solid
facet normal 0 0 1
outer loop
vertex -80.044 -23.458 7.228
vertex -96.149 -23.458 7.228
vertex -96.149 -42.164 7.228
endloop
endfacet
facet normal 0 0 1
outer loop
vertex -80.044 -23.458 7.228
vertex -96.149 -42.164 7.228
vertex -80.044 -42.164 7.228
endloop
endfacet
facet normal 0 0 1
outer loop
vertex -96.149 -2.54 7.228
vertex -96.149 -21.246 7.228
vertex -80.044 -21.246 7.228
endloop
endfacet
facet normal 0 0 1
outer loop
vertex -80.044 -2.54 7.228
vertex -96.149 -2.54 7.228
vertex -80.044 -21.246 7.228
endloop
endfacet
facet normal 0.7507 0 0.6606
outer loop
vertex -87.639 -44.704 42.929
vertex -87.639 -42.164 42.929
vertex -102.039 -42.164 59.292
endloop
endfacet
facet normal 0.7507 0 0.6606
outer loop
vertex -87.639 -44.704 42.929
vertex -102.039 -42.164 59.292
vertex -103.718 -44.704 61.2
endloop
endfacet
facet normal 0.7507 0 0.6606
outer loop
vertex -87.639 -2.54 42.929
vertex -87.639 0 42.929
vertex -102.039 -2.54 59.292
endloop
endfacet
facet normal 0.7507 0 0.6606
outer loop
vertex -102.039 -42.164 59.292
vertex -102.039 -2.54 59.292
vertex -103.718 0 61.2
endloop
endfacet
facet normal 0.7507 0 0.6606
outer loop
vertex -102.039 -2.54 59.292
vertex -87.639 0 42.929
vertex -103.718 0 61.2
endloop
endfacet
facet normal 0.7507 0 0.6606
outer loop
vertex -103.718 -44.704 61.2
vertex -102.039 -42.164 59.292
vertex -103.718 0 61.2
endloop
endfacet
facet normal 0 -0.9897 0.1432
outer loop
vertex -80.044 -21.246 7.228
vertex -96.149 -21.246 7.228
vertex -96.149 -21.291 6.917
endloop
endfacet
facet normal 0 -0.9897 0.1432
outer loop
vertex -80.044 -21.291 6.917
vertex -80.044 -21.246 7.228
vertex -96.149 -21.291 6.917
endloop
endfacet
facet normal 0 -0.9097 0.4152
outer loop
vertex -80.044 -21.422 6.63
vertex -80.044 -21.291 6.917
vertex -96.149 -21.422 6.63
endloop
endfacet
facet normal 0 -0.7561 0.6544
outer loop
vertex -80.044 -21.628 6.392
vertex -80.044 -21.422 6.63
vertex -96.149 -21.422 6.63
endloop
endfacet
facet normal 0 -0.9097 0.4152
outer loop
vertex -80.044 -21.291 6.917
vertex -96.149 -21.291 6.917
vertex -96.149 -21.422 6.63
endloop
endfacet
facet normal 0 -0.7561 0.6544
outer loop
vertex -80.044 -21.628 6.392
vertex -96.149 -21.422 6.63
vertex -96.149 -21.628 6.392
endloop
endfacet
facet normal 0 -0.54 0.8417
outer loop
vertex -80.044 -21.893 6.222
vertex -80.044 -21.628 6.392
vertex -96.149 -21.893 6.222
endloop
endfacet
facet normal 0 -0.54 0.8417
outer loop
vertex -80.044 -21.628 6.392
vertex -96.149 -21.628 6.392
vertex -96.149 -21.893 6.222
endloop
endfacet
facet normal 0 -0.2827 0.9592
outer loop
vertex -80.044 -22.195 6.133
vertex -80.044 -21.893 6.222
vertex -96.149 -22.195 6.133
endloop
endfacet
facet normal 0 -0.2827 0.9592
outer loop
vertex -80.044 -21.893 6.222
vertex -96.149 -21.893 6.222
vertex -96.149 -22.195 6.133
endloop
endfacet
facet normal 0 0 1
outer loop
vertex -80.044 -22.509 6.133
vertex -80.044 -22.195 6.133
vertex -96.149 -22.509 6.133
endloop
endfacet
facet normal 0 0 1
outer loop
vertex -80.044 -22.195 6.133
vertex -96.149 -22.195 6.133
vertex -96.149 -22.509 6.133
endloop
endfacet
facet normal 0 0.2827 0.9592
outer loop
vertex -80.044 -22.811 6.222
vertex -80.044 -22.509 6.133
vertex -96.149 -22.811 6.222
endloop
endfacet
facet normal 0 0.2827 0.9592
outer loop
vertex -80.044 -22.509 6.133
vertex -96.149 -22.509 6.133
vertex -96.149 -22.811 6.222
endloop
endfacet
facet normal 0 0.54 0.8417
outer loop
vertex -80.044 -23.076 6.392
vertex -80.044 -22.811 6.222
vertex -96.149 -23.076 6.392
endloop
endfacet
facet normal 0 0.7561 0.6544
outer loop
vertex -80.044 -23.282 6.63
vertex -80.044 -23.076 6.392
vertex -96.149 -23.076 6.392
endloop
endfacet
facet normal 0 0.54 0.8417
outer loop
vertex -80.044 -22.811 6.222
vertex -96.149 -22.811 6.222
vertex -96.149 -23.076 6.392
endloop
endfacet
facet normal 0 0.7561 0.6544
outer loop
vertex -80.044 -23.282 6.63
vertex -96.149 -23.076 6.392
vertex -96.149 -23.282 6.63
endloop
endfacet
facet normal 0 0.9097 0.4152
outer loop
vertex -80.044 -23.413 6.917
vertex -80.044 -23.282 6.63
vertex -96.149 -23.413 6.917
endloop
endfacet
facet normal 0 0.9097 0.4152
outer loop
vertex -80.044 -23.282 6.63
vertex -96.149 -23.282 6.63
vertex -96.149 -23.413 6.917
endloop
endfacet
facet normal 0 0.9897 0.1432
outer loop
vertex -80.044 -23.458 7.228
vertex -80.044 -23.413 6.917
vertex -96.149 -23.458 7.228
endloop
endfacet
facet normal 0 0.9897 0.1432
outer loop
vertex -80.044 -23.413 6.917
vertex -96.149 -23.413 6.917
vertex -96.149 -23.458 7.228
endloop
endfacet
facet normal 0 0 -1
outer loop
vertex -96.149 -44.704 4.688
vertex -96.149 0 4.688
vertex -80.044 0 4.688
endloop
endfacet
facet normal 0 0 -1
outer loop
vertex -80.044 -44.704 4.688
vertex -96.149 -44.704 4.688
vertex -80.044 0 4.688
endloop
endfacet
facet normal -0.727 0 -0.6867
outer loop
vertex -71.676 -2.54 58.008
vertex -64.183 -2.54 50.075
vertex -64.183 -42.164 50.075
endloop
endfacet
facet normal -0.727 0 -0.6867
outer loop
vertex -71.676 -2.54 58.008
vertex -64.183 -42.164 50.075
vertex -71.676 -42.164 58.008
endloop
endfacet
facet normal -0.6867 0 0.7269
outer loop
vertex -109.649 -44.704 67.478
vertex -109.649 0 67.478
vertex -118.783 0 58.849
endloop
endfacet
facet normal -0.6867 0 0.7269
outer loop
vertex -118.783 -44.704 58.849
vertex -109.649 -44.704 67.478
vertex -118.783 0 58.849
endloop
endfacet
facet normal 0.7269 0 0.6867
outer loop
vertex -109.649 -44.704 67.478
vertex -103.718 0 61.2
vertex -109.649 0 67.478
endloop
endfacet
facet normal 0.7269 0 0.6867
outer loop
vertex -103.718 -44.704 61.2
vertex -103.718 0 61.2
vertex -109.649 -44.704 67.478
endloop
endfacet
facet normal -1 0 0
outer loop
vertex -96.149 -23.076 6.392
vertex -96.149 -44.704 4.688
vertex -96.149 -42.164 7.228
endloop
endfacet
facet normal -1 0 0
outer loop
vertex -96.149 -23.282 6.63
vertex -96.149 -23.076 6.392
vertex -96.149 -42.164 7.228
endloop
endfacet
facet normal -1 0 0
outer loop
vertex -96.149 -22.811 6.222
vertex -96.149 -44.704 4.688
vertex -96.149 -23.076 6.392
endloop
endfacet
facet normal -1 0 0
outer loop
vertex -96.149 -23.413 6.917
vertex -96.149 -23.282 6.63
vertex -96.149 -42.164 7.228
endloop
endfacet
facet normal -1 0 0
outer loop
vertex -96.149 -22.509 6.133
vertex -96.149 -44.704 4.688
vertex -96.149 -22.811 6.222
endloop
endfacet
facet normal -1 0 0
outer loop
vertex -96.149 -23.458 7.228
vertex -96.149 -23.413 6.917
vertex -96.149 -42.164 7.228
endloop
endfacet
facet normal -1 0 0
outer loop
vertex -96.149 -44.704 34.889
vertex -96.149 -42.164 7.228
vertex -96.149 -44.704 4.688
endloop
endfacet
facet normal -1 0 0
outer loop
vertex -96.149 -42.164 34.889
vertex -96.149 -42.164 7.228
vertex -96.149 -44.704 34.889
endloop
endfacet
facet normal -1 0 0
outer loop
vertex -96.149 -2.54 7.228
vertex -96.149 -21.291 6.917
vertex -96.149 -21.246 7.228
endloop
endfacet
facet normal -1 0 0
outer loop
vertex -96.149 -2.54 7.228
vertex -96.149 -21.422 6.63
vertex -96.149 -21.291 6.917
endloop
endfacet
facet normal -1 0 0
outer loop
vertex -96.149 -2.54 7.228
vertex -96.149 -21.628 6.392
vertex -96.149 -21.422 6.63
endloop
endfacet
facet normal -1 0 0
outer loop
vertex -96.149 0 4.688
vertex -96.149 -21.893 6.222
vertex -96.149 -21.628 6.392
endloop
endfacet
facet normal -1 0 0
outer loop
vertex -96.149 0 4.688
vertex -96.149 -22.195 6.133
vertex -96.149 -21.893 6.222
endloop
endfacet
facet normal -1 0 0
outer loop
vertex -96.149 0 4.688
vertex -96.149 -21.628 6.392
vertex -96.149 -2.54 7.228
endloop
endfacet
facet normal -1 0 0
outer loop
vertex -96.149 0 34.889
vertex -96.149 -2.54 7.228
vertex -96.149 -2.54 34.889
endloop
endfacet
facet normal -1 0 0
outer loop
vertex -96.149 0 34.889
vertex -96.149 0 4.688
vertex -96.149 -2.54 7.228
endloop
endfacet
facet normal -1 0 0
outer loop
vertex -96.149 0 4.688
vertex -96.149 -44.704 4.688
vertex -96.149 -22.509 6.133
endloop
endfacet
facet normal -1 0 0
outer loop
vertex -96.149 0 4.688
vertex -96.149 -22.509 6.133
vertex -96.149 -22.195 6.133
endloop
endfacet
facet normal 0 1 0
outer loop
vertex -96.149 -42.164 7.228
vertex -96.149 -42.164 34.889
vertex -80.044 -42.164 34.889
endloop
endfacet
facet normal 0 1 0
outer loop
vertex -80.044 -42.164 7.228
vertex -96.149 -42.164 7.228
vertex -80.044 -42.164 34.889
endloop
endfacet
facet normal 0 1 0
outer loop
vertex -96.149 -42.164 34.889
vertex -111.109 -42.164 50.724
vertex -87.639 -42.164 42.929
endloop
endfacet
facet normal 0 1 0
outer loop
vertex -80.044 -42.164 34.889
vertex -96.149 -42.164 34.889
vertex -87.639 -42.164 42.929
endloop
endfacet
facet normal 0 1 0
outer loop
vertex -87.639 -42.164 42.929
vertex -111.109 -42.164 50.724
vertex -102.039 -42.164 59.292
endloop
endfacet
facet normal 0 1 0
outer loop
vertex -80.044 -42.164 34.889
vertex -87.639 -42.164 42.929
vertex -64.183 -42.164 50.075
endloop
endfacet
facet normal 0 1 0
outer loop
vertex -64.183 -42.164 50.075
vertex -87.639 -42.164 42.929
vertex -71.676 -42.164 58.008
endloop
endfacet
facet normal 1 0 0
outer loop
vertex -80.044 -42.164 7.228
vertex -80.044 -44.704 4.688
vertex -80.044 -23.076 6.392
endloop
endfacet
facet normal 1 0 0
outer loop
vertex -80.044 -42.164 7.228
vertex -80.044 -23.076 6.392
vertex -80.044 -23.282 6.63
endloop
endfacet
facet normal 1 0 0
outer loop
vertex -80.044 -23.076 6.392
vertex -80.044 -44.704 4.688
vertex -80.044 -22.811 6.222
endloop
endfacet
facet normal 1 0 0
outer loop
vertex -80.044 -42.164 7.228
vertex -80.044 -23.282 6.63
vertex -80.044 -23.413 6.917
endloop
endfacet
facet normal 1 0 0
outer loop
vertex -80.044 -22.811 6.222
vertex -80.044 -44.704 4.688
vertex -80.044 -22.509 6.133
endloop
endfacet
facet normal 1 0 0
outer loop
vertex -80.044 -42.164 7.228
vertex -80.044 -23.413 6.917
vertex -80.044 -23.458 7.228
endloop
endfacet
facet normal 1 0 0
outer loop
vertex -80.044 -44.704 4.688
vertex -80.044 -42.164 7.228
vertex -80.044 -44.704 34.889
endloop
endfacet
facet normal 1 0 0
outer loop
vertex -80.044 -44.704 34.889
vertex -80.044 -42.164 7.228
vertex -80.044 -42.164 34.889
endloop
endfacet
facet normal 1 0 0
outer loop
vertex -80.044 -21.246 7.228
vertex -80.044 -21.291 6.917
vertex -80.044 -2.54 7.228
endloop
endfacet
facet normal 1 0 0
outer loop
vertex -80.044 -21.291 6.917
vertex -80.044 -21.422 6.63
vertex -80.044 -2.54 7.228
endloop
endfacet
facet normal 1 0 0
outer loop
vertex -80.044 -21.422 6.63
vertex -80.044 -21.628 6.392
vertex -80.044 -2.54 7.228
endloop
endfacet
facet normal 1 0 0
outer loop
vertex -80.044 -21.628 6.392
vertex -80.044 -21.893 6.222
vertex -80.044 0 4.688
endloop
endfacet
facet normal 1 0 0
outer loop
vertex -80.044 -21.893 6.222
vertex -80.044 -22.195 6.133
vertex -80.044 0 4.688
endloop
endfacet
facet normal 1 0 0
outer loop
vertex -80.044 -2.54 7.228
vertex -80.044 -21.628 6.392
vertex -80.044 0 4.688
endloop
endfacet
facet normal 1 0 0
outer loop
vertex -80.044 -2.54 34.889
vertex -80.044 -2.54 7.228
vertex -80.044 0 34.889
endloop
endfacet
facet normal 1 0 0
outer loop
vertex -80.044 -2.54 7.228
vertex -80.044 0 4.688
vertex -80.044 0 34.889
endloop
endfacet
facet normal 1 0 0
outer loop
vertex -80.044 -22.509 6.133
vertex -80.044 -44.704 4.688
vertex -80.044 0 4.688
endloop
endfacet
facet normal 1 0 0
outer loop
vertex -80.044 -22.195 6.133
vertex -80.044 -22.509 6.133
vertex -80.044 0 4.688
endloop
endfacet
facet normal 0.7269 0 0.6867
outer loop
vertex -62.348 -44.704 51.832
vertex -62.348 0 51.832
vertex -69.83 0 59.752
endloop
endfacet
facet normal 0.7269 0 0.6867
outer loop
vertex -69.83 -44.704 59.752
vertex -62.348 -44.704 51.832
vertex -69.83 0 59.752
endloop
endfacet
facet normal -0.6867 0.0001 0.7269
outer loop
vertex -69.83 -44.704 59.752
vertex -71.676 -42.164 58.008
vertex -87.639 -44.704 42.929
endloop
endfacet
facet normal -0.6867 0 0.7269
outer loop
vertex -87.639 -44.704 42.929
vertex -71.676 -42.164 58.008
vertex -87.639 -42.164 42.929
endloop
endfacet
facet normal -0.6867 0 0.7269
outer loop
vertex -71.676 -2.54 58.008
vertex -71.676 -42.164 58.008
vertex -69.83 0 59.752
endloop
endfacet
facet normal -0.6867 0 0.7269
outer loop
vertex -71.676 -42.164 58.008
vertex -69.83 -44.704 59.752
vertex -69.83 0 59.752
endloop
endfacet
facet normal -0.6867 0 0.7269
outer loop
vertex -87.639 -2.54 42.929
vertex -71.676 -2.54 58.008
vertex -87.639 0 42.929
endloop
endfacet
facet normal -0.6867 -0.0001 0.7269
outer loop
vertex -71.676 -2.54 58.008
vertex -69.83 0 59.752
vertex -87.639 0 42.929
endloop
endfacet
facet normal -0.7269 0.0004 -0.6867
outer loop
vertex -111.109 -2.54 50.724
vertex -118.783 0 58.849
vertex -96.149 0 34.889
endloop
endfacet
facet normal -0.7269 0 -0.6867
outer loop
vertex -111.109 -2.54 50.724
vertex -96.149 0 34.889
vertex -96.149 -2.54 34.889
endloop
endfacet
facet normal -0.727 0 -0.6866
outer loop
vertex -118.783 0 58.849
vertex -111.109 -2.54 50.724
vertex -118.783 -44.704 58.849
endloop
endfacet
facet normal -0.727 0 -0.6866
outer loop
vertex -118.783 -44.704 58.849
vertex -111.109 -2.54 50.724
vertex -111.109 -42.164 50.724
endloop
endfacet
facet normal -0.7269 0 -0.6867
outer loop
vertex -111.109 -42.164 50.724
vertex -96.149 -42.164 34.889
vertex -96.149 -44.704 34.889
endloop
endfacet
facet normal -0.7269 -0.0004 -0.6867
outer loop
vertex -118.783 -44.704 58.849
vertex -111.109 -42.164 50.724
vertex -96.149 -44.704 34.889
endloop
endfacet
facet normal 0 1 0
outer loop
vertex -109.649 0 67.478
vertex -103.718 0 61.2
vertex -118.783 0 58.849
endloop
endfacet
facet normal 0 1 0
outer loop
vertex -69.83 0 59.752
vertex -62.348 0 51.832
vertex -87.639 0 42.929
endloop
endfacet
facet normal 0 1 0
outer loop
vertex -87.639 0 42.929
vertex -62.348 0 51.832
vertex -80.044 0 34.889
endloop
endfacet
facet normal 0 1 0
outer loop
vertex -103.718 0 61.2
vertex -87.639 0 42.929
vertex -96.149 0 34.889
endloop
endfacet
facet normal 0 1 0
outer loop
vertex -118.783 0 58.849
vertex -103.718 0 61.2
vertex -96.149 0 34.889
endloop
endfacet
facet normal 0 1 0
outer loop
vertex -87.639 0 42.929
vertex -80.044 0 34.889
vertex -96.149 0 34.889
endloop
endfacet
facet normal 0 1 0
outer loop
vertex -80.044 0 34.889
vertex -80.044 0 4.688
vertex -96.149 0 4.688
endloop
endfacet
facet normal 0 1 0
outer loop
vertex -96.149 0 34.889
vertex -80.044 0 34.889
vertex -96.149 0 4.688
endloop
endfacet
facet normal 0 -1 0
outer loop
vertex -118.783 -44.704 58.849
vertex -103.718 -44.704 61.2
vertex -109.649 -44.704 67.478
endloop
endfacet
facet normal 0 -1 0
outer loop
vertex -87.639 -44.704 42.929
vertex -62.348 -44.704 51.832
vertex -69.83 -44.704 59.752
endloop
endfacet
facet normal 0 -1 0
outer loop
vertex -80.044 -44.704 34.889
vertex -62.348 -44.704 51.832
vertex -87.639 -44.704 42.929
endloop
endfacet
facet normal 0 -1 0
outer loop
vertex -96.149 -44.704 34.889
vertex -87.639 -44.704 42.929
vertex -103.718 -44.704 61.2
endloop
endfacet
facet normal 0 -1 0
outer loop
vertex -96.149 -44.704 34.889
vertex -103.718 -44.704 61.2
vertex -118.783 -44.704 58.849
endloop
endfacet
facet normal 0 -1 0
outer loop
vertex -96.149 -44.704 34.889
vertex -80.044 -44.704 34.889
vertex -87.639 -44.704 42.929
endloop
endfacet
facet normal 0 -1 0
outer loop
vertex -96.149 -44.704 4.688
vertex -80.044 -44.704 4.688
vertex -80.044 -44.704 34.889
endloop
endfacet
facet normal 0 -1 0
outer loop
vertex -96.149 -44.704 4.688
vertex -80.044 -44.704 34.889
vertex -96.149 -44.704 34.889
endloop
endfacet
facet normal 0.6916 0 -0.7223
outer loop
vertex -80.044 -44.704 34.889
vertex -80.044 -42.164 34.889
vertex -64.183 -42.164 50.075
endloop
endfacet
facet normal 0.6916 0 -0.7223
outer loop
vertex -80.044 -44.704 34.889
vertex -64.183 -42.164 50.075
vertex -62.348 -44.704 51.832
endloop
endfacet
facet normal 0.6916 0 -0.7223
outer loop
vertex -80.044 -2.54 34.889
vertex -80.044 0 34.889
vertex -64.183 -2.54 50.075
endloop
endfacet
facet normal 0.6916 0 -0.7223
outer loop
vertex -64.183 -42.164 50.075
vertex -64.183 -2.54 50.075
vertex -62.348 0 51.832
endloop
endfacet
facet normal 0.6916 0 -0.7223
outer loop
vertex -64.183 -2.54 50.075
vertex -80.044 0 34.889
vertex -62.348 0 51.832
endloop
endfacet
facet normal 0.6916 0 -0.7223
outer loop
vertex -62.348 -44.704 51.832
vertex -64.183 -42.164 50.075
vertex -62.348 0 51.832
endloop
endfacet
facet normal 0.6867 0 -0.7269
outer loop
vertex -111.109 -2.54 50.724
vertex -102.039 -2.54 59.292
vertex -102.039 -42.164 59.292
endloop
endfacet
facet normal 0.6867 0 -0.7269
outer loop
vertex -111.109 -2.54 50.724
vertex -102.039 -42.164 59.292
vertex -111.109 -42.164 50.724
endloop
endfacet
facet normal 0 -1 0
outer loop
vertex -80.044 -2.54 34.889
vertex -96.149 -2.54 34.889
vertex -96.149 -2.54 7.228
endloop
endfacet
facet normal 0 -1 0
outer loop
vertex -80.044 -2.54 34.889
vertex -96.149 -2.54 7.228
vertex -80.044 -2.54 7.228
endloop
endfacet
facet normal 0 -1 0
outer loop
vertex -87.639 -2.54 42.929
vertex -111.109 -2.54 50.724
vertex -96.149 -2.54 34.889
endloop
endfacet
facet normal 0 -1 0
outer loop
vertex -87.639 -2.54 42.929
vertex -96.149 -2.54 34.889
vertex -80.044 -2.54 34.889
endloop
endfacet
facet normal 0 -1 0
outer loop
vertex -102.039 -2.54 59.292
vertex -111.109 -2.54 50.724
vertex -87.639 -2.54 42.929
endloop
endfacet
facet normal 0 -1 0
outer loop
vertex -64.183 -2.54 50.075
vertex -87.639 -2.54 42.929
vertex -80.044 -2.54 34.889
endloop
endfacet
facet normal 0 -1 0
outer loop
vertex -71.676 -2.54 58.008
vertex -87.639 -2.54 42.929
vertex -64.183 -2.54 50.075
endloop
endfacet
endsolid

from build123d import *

# Parameters (mm, degrees)
F0_W     = 16.1053412664
F0_H     = 30.2006552678
F1_DEPTH = 44.704
F2_T     = -2.54
F3_DEPTH = 8.636
F5_DEPTH = 25.4


with BuildPart() as f1:
    # F0 (on Front) → F1 (new body)
    with BuildSketch(Plane.XZ):
        Polygon((-87.6387814232, 42.9285356432), (-103.7184670568, 61.1999630928), (-112.852960825, 52.5708459318), (-96.1492801466, 34.8888902675), align=None)
        Polygon((-80.0439388802, 34.8888902675), (-87.6387814232, 42.9285356432), (-96.1492801466, 34.8888902675), align=None)
        Polygon((-69.8299892996, 59.7520354048), (-87.6387814232, 42.9285356432), (-80.0439388802, 34.8888902675), (-62.3481592001, 51.8320212083), align=None)
        with Locations((-88.0966095134, 19.7885626337)):
            Rectangle(F0_W, F0_H)
    extrude(amount=F1_DEPTH)

    # F2
    f2_openings = [f1.faces().sort_by_distance(p)[0] for p in [
        (-104.50112, -22.352, 43.729868),
        (-96.14928, -22.352, 19.788563),
        (-80.043939, -22.352, 19.788563),
        (-71.196049, -22.352, 43.360456),
        (-95.678624, -22.352, 52.064249),
        (-78.734385, -22.352, 51.340286),
    ]]
    offset(amount=F2_T, openings=f2_openings)

    # F3 (add): a face of the model
    f3_faces = [f1.faces().sort_by_distance(p)[0] for p in [
        (-108.2857139409, -22.352, 56.8854045123),
    ]]
    extrude(f3_faces, amount=F3_DEPTH)

    # F4 (on face) → F5 (cut)
    with BuildSketch(Plane(origin=(-96.1492801466, 0, 0), x_dir=(0, -1, 0), z_dir=(-1, 0, 0))):
        with BuildLine():
            ThreePointArc((21.2460036068, 7.2282349998), (22.352, 6.1222386066), (23.4579963932, 7.2282349998))
            Line((23.4579963932, 7.2282349998), (21.2460036068, 7.2282349998))
        make_face()
    extrude(amount=-F5_DEPTH, mode=Mode.SUBTRACT)


solid = f1.part
